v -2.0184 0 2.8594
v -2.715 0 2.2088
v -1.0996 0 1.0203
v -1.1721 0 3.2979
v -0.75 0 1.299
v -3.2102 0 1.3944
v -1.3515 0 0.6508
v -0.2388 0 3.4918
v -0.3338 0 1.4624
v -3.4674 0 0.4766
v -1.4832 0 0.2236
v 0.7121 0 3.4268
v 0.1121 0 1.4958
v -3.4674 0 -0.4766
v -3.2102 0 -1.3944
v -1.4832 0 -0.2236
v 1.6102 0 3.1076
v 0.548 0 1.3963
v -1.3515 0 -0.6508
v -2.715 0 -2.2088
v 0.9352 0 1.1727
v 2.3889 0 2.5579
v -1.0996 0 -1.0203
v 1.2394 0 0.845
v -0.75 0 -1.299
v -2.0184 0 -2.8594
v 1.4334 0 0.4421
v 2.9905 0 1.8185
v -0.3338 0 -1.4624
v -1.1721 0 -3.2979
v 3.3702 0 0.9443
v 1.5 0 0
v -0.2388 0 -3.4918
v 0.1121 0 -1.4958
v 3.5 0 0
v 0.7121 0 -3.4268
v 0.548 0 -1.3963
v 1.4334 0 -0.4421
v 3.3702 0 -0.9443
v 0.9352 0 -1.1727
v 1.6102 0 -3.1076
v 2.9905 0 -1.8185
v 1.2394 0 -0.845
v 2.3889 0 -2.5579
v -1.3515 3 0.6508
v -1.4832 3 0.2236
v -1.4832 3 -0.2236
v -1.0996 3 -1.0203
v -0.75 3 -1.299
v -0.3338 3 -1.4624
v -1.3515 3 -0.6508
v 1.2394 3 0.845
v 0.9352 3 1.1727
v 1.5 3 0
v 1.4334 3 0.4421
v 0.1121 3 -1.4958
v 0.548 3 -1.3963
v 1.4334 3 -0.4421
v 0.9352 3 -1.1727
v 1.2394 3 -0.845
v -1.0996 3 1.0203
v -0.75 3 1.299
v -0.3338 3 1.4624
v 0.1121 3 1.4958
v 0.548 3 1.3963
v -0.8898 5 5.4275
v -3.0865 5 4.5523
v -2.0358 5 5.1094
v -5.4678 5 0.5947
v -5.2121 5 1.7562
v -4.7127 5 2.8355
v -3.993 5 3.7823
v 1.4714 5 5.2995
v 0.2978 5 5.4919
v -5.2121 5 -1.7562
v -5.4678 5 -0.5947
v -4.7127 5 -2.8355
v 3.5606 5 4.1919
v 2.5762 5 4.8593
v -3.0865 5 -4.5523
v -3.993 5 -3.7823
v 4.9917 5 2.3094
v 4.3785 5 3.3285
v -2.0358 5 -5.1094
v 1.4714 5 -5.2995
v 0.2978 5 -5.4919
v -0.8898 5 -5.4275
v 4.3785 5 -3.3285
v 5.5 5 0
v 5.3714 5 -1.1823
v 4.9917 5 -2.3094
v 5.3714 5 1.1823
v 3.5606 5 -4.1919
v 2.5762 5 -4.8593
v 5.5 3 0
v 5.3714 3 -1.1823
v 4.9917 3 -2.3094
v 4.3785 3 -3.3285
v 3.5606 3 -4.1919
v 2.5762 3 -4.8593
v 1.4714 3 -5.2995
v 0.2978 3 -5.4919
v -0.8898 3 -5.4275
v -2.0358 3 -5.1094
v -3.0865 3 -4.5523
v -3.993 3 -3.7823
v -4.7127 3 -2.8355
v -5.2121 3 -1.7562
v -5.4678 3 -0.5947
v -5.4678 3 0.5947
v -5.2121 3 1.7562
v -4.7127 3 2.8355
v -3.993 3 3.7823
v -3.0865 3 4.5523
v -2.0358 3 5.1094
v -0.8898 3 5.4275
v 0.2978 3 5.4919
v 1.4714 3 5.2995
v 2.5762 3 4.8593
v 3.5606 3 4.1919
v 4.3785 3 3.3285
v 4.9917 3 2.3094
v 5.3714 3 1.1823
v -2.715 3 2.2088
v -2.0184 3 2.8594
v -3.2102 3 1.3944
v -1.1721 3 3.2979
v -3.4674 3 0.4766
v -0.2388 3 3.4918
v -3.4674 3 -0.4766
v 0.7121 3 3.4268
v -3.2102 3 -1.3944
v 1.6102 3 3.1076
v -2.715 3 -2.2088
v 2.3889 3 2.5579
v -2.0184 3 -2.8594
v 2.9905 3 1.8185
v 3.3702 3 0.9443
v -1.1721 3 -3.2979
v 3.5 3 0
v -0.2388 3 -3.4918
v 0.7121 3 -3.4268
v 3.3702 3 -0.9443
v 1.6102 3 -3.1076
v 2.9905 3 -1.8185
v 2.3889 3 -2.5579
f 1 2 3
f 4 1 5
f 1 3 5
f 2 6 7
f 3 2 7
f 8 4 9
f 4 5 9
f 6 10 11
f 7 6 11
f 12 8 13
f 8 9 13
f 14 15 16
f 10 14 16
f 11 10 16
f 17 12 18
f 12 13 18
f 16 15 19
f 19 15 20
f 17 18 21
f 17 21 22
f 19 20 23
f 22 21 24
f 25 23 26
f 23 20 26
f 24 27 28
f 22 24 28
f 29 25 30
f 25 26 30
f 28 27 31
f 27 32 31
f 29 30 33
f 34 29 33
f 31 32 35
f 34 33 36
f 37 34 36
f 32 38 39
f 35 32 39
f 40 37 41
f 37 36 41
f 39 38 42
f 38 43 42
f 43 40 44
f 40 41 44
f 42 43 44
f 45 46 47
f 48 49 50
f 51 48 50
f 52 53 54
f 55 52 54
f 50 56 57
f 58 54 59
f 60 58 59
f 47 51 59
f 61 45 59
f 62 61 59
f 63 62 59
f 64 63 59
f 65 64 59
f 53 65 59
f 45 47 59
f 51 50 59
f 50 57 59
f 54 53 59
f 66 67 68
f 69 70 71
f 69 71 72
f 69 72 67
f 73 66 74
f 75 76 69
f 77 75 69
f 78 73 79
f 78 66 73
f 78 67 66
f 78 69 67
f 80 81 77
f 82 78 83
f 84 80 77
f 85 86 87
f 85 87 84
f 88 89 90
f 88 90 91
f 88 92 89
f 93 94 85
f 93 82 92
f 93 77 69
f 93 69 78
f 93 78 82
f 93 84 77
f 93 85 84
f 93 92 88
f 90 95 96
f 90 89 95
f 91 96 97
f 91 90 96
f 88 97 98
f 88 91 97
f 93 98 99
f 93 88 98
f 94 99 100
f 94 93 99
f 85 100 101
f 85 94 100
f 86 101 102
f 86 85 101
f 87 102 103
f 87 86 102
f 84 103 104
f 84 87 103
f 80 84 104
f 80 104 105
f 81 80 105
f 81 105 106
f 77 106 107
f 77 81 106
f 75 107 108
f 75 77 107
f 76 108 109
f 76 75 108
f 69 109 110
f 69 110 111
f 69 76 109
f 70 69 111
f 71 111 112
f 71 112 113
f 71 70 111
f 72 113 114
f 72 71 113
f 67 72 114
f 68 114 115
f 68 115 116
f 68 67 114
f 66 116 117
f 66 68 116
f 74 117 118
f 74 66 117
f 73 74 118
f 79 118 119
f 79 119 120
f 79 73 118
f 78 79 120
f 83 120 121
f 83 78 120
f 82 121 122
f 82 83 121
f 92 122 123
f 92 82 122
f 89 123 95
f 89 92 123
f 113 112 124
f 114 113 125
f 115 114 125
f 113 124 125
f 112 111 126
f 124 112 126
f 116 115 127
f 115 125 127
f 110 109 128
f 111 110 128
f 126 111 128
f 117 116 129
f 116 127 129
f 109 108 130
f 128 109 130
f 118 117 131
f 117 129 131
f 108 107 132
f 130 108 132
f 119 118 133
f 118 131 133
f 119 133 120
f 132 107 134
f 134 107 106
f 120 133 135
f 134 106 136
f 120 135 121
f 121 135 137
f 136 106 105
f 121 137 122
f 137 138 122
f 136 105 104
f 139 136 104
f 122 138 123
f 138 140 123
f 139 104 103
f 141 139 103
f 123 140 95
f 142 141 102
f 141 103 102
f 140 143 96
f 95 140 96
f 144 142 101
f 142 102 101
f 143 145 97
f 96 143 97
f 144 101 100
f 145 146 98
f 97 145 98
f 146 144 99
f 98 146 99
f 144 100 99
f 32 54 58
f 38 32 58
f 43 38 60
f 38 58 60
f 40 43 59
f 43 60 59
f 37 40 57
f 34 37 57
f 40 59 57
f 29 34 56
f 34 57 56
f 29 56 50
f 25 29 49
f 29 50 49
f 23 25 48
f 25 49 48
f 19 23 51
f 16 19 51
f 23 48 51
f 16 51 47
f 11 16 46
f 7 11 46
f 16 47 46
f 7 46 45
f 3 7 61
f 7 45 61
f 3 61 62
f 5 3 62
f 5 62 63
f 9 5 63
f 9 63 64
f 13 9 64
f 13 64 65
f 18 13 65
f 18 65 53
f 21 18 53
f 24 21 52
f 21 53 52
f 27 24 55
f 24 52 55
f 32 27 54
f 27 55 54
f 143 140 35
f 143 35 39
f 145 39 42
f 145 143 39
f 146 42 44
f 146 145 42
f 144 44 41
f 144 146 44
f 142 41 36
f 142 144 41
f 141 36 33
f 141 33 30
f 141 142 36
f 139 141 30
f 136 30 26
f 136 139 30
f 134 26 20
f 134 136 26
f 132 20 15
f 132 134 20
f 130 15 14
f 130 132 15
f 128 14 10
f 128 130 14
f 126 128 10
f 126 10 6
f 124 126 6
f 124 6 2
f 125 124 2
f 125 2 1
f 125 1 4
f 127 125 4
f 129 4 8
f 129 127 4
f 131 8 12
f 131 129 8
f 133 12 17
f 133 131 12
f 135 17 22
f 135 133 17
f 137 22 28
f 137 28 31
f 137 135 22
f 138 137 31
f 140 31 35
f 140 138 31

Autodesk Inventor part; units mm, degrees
ref_plane "YZ Plane" through (0, 0, 0) normal (1, 0, 0) x (0, 1, 0)
ref_plane "XZ Plane" through (0, 0, 0) normal (0, 1, 0) x (-1, 0, 0)
ref_plane "XY Plane" through (0, 0, 0) normal (0, 0, 1) x (1, 0, 0)
sketch "Sketch1" plane through (0, 0, 0) normal (0, 0, 1) x (1, 0, 0)
  line L0 (0, 0) -> (1.5, 0)
  line L1 (1.5, 0) -> (1.5, 3)
  line L2 (1.5, 3) -> (5.5, 3)
  line L3 (5.5, 3) -> (5.5, 5)
  line L4 (5.5, 5) -> (0, 5)
  line L5 (0, 5) -> (0, 3)
  line L6 (0, 3) -> (1.5, 3)
  line L7 (1.5, 0) -> (3.5, 0)
  line L8 (3.5, 0) -> (3.5, 3)
  line L9 (0, -1) -> (0, 6) projected
  dimension "d0" = 1.5
  dimension "d1" = 3
  dimension "d2" = 4
  dimension "d3" = 2
  dimension "d4" = 2
revolve "Revolution1" add sketch "Sketch1" angle 360 about axis through (0, -10, 0) along (0, 1, 0) contours L1 L2 L8 L7 | L5 L4 L3 L2 L6
thread "Thread1" size "M3x0.5" class "6H" standard "ISO Metric profile" full length
properties part number "FijadorParaBloqueo"
